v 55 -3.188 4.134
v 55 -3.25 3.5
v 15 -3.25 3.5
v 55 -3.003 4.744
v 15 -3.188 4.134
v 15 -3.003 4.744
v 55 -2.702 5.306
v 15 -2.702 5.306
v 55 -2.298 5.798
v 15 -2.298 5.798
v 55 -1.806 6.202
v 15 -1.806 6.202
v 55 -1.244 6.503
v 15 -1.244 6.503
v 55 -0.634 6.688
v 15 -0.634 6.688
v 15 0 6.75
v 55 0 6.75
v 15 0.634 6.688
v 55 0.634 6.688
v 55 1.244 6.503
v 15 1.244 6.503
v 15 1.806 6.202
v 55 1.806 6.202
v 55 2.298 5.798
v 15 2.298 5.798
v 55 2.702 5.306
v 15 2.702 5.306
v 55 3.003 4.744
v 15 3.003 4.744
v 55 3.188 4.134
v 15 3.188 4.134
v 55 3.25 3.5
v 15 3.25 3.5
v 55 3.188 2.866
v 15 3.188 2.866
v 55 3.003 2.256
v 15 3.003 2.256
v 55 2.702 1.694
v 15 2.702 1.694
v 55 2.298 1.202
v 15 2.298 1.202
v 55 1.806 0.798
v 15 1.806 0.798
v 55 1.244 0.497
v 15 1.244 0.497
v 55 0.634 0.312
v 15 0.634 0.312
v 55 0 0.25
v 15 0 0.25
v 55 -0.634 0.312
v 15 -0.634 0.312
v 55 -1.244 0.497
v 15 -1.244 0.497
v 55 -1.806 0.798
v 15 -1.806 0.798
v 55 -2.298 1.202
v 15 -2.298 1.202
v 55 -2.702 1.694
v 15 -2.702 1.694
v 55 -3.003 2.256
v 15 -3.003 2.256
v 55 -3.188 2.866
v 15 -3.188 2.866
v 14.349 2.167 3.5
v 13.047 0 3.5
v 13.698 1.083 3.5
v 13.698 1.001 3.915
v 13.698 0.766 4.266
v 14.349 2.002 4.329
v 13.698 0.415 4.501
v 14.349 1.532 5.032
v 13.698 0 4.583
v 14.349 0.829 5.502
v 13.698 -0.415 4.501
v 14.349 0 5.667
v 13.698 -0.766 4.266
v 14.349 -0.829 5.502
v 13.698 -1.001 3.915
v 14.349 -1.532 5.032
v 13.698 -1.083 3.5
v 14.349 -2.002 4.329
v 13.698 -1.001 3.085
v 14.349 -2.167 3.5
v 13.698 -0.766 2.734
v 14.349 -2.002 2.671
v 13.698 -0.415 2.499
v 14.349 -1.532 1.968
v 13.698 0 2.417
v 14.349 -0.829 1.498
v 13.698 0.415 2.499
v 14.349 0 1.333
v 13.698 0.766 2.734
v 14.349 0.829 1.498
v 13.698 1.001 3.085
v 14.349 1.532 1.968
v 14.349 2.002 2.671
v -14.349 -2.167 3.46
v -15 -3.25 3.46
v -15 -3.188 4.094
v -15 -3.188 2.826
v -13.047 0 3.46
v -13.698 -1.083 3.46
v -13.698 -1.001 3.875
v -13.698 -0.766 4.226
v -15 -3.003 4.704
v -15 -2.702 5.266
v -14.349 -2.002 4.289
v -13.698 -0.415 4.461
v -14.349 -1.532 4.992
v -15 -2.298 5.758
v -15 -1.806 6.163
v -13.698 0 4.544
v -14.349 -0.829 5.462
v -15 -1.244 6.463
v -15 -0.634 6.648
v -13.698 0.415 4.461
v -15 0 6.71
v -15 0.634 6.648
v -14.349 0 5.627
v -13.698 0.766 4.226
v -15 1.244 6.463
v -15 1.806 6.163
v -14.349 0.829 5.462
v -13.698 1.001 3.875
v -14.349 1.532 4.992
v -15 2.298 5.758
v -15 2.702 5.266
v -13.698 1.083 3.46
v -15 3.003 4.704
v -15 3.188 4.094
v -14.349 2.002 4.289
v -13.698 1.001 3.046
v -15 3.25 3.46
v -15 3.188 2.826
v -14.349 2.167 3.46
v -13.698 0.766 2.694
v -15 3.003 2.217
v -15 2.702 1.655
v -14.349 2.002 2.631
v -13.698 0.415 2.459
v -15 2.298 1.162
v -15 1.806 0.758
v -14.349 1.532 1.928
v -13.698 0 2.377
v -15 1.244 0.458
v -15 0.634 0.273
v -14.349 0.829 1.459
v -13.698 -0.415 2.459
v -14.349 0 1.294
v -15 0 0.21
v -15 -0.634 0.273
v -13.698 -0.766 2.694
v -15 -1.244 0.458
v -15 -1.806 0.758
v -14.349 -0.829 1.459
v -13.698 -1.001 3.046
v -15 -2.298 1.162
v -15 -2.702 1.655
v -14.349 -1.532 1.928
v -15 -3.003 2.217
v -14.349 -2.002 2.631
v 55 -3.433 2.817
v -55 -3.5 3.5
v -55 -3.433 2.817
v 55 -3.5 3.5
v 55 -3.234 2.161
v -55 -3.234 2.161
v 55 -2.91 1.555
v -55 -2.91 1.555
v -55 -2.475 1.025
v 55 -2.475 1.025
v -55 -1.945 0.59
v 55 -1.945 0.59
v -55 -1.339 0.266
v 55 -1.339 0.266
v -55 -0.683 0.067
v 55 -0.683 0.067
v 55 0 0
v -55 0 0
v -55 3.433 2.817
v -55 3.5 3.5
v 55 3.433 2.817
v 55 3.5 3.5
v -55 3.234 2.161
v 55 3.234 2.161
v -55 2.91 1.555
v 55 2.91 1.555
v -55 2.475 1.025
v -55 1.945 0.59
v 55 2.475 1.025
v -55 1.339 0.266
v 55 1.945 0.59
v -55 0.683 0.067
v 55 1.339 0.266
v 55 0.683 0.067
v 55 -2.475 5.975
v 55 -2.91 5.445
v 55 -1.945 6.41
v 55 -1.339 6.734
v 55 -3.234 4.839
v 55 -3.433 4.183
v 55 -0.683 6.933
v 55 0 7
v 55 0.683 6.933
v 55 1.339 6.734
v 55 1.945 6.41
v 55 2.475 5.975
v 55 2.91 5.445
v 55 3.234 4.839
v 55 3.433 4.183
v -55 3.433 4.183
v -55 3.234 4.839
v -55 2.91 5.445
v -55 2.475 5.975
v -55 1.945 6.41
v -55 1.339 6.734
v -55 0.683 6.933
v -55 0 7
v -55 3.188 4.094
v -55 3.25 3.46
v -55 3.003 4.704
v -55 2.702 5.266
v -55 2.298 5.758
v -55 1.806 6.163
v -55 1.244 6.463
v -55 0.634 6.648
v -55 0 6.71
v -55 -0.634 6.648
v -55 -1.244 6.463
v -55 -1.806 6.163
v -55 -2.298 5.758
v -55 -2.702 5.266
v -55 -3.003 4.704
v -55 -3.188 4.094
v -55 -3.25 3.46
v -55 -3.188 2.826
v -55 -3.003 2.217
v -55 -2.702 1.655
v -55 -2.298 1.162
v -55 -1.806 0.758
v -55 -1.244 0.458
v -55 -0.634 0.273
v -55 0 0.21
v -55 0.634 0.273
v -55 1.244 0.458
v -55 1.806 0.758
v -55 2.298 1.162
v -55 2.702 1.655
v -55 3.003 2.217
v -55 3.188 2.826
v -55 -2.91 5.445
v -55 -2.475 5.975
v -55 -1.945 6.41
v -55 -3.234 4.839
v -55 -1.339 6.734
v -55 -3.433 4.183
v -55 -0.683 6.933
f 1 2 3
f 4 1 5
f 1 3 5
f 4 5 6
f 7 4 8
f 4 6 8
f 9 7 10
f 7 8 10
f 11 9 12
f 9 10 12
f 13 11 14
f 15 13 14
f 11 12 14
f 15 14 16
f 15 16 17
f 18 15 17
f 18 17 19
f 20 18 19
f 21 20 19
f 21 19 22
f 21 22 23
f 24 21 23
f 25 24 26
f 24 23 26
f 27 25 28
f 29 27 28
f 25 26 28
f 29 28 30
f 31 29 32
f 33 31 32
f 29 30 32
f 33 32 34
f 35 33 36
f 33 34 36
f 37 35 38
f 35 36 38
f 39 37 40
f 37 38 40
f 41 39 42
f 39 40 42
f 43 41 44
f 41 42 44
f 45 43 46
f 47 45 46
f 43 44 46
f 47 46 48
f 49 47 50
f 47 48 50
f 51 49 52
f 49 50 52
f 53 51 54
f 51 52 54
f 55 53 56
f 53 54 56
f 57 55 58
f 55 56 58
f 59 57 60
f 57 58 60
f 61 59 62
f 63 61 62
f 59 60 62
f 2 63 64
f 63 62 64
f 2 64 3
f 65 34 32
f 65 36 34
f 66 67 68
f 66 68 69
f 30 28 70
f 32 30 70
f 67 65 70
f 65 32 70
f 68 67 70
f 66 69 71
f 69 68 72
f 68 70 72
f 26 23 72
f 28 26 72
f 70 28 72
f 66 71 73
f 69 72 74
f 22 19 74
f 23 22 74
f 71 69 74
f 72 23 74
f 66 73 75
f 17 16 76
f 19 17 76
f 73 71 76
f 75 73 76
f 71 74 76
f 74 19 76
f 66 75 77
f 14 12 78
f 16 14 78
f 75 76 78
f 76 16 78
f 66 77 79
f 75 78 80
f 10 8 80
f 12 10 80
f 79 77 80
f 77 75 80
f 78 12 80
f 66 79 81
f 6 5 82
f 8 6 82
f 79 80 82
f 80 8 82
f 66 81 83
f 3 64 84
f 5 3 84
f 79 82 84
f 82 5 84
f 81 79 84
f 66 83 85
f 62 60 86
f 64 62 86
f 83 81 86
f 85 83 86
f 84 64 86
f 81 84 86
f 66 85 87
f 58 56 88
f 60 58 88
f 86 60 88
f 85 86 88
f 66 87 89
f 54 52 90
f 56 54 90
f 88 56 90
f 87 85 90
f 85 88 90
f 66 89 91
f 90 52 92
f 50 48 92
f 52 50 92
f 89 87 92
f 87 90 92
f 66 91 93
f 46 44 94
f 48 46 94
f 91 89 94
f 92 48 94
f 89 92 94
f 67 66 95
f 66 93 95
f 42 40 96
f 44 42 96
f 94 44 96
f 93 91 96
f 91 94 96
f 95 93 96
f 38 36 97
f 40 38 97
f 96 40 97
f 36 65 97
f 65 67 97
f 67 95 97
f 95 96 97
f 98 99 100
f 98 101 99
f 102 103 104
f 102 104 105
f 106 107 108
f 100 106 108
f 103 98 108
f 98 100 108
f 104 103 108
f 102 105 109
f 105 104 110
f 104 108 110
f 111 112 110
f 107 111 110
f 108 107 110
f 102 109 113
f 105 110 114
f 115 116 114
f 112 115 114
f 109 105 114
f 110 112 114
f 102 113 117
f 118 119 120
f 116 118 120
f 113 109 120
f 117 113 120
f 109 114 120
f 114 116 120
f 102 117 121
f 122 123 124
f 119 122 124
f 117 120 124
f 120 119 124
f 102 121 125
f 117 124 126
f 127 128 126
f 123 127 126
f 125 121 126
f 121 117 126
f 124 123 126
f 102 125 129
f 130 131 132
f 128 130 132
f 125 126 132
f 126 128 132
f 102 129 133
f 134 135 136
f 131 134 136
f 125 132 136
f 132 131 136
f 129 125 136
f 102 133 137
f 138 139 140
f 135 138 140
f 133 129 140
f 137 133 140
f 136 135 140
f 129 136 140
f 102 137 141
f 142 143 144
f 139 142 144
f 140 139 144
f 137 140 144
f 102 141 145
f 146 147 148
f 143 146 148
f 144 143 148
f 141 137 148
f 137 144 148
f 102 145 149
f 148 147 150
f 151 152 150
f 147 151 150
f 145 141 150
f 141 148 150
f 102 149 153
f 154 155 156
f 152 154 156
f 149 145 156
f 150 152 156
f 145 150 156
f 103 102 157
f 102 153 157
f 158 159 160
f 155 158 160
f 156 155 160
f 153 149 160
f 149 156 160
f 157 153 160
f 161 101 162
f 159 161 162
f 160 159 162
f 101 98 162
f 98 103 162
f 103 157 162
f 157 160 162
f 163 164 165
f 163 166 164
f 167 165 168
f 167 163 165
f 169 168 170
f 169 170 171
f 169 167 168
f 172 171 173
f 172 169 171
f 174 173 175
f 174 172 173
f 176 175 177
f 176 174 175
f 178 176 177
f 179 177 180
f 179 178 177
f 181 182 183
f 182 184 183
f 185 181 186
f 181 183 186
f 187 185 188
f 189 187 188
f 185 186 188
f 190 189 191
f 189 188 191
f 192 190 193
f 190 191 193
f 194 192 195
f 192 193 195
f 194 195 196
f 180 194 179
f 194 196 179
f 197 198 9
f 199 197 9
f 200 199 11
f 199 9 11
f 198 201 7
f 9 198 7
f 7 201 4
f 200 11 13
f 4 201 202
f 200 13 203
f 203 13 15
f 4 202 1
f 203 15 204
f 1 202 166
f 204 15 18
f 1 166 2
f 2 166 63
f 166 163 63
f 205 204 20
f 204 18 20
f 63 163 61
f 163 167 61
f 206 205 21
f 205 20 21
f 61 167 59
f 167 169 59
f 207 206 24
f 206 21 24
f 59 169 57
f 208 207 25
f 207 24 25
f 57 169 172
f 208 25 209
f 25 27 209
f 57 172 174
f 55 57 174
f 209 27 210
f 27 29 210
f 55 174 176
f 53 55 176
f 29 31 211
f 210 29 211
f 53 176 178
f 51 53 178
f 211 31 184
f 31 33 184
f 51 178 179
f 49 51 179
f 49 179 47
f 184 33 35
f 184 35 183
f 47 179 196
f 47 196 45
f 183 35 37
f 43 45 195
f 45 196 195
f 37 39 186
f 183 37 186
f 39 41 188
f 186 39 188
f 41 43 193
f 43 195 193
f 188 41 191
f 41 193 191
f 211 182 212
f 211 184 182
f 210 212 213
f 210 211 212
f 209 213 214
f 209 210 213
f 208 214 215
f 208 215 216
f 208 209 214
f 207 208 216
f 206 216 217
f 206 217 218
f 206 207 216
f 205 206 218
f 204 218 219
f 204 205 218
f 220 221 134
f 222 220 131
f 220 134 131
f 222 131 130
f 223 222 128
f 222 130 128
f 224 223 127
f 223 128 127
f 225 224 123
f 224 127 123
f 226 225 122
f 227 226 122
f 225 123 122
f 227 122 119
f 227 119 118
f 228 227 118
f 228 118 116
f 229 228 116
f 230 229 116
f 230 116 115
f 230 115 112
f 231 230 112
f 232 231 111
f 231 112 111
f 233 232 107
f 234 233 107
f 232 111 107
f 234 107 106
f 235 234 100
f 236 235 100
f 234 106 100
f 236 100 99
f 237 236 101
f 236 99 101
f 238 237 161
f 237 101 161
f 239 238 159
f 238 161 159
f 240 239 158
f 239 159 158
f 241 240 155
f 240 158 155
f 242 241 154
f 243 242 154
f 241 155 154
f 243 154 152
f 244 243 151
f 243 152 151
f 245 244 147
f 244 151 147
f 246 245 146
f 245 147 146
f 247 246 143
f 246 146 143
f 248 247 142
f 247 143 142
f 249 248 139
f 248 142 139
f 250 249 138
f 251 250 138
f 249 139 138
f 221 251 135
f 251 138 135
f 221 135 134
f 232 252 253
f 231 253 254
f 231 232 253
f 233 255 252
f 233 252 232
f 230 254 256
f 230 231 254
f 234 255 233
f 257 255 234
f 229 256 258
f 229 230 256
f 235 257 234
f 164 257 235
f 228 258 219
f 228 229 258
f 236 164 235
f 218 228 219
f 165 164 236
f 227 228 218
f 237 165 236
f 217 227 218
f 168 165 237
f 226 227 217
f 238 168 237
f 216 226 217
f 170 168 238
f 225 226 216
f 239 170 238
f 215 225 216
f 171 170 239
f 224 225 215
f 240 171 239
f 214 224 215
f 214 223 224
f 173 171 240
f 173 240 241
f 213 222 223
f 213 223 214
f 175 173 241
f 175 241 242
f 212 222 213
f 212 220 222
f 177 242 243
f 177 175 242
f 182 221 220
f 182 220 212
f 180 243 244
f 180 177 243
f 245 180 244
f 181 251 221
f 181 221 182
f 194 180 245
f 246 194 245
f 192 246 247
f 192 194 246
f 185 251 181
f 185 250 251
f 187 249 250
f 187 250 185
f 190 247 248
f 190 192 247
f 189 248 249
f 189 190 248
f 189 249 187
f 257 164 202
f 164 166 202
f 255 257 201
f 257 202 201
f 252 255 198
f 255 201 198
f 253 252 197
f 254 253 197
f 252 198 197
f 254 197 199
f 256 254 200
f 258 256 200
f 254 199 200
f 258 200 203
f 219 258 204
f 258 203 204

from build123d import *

# Parameters (mm, degrees)
F0_W     = 110
F0_H     = 7
F1_DEPTH = 7
F3_R     = 3.49999
F6_D     = 6.5
F6_DEPTH = 40
F6_TIP   = 1.9527970118
F7_D     = 6.5
F7_DEPTH = 40
F7_TIP   = 1.9527970118


# Not quite as in the source:
# - a fillet or chamfer is up to 0.001 mm smaller than in the source, because OpenCascade refuses the exact size


with BuildPart() as f1:
    # F0 (on Top) → F1 (new body)
    with BuildSketch(Plane.XY):
        Rectangle(F0_W, F0_H)
    extrude(amount=F1_DEPTH)

    # F3 (radius 3.5 in the source; OpenCascade refuses exactly that, so slightly less here)
    f3_edges = [f1.edges().sort_by_distance(p)[0] for p in [
        (0, -3.5, 7),
        (0, 3.5, 7),
        (0, 3.5, 0),
        (0, -3.5, 0),
    ]]
    fillet(f3_edges, radius=F3_R)

    # F6
    with Locations(Plane.YZ.offset(55)):
        with Locations((0, 3.5)):
            Hole(F6_D / 2, depth=F6_DEPTH)
            with Locations((0, 0, -(F6_DEPTH + F6_TIP / 2))):  # 118° drill point
                Cone(0, F6_D / 2, F6_TIP, mode=Mode.SUBTRACT)

    # F7
    with Locations(Plane(origin=(-55, 0, 0), x_dir=(0, -1, 0), z_dir=(-1, 0, 0))):
        with Locations((0, 3.4602470696)):
            Hole(F7_D / 2, depth=F7_DEPTH)
            with Locations((0, 0, -(F7_DEPTH + F7_TIP / 2))):  # 118° drill point
                Cone(0, F7_D / 2, F7_TIP, mode=Mode.SUBTRACT)


solid = f1.part
